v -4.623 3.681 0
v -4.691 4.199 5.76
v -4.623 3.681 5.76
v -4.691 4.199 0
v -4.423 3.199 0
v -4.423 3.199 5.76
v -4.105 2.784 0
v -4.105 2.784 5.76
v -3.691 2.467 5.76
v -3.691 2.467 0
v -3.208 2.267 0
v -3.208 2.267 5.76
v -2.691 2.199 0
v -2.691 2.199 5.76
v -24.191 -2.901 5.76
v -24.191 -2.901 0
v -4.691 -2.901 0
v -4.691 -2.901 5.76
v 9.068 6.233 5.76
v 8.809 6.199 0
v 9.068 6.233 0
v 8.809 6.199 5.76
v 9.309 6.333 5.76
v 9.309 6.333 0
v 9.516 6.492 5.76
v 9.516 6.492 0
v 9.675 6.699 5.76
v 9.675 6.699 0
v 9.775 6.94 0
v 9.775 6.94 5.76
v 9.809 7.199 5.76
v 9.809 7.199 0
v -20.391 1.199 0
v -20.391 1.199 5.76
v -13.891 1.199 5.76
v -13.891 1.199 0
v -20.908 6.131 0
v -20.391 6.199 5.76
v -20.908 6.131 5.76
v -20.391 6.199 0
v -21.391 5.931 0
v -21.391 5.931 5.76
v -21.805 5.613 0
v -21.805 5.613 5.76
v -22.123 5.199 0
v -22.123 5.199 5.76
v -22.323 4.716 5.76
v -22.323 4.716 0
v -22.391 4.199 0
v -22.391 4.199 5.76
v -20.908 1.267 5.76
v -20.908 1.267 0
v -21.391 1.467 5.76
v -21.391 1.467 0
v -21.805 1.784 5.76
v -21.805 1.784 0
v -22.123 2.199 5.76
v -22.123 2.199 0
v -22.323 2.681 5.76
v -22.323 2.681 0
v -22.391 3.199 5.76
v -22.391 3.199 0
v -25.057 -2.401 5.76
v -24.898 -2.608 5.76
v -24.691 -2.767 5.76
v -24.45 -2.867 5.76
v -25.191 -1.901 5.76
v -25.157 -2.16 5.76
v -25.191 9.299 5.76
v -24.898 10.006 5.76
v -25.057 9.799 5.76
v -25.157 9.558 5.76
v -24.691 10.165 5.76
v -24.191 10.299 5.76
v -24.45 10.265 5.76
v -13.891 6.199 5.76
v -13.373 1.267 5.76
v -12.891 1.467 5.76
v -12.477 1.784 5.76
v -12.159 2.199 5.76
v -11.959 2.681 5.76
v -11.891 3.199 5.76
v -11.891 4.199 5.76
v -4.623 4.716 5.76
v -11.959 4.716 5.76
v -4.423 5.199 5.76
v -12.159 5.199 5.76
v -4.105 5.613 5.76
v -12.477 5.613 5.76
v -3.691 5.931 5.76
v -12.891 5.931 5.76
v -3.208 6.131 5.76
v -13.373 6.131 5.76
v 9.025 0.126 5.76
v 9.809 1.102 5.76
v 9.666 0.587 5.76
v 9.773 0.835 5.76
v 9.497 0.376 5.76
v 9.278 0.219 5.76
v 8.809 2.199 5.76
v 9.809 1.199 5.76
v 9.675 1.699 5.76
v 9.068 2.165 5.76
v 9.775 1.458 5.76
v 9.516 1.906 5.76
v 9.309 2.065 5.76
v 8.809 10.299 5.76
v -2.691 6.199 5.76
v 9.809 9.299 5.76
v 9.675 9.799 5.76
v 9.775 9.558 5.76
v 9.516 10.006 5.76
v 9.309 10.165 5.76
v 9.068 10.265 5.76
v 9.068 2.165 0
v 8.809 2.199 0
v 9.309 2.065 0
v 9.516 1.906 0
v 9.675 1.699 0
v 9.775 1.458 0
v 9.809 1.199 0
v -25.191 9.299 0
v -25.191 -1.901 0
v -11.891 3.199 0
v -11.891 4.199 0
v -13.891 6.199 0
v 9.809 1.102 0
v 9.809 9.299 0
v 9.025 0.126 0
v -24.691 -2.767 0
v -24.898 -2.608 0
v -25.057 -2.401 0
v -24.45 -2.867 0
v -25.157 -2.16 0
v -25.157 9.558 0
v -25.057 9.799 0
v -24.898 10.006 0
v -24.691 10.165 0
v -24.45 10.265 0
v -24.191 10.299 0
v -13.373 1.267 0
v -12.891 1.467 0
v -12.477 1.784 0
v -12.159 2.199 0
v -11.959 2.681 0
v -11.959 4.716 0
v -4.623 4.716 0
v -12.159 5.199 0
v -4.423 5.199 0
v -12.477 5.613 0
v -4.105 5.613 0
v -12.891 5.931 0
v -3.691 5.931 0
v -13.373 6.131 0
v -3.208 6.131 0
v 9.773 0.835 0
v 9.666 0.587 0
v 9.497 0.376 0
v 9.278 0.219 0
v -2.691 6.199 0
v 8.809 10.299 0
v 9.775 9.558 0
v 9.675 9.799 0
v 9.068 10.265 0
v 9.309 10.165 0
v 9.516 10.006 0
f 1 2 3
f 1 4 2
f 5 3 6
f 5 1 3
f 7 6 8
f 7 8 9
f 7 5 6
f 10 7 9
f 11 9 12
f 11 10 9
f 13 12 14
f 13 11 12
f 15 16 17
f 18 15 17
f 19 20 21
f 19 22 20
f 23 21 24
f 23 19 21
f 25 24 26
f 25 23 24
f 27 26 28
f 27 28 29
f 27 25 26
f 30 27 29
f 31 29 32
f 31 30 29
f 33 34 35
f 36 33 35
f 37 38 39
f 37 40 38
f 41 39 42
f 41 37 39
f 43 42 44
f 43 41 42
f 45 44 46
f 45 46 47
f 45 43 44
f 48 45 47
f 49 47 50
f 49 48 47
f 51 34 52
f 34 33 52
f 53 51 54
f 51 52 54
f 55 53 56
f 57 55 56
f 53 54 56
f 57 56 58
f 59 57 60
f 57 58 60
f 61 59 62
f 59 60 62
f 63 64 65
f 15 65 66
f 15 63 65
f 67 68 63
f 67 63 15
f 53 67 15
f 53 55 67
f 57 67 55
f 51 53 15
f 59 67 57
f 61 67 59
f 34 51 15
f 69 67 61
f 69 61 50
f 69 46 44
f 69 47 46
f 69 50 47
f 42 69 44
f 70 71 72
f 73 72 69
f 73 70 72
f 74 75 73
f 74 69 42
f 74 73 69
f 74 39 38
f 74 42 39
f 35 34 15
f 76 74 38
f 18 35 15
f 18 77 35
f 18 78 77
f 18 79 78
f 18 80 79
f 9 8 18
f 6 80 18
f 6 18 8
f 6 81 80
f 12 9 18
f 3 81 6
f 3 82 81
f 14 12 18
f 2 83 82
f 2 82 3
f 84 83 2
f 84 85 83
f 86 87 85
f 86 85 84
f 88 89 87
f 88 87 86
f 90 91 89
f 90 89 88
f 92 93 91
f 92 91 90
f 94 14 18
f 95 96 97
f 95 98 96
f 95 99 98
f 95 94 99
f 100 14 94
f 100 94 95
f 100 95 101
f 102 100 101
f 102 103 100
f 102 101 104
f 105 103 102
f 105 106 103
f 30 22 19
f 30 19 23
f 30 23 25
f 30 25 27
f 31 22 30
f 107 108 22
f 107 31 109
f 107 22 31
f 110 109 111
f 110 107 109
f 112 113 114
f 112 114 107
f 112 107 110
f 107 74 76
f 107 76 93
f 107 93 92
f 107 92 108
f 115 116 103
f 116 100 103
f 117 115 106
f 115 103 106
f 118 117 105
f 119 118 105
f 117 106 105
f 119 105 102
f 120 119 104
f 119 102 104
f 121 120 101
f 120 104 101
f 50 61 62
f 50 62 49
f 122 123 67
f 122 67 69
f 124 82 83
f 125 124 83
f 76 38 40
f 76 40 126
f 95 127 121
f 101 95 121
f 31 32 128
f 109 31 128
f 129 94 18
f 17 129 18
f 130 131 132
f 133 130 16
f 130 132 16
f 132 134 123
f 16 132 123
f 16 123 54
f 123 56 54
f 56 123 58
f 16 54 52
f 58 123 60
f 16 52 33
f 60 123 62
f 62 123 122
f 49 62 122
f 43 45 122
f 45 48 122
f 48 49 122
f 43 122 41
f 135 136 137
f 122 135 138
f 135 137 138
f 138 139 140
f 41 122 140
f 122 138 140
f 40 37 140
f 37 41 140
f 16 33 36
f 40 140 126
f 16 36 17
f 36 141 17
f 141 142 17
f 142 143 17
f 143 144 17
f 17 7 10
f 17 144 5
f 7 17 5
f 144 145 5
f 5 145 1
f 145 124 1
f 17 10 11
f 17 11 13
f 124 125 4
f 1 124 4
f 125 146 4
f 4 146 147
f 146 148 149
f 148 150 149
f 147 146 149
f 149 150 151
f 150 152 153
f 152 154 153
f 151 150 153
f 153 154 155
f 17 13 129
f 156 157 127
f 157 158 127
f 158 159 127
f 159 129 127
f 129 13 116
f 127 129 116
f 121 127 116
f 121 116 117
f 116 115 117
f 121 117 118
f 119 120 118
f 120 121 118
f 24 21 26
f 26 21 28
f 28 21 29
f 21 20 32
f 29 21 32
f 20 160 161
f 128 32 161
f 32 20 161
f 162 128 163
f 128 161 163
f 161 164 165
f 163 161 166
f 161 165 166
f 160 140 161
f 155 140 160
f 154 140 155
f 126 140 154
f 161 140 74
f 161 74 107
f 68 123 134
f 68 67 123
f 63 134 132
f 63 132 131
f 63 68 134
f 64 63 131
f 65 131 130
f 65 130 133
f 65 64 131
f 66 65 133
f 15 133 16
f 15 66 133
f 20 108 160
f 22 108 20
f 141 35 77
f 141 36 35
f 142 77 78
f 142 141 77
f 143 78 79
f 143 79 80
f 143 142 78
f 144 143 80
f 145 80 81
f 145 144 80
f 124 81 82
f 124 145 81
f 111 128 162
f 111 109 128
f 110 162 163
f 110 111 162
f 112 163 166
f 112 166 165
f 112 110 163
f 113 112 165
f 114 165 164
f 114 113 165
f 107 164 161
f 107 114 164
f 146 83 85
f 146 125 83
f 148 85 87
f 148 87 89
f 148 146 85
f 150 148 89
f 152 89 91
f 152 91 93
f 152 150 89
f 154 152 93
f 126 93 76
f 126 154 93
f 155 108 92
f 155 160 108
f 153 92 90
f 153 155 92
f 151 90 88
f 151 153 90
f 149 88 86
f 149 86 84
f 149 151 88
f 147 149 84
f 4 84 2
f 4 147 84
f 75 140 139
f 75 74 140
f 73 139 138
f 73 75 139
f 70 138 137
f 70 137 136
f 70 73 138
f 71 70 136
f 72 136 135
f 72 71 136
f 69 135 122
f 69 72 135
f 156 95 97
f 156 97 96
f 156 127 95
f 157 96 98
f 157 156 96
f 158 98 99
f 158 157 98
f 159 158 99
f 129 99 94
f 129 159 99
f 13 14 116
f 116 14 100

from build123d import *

# Parameters (mm, degrees)
F0_W     = 35
F0_H     = 13.2
F1_DEPTH = 5.76
F2_W     = 10.5
F2_H     = 5
F2_W_2   = 15
F2_H_2   = 4
F3_DEPTH = 25
F4_R     = 1.99999
F5_R     = 1


# Not quite as in the source:
# - a fillet or chamfer is up to 0.001 mm smaller than in the source, because OpenCascade refuses the exact size


with BuildPart() as f1:
    # F0 (on Top) → F1 (new body)
    with BuildSketch(Plane.XY):
        with Locations((-7.6907900348, 3.6986840781)):
            Rectangle(F0_W, F0_H)
    extrude(amount=F1_DEPTH)

    # F2 (on face) → F3 (cut)
    with BuildSketch(Plane.XY.offset(5.76)):
        Polygon((-4.6907900348, -2.9013159219), (9.8092099652, -2.9013159219), (9.8092099652, 0.2986840781), align=None)
        with Locations((-17.1407900348, 3.6986840781)):
            Rectangle(F2_W, F2_H)
        with Locations((2.8092099652, 4.1986840781)):
            Rectangle(F2_W_2, F2_H_2)
    extrude(amount=-F3_DEPTH, mode=Mode.SUBTRACT)

    # F4 (radius 2 in the source; OpenCascade refuses exactly that, so slightly less here)
    f4_edges = [f1.edges().sort_by_distance(p)[0] for p in [
        (-22.39079, 6.198684, 2.88),
        (-11.89079, 6.198684, 2.88),
        (-11.89079, 1.198684, 2.88),
        (-22.39079, 1.198684, 2.88),
        (-4.69079, 2.198684, 2.88),
        (-4.69079, 6.198684, 2.88),
    ]]
    fillet(f4_edges, radius=F4_R)

    # F5
    f5_edges = [f1.edges().sort_by_distance(p)[0] for p in [
        (9.80921, 10.298684, 2.88),
        (9.80921, 6.198684, 2.88),
        (9.80921, 2.198684, 2.88),
        (9.80921, 0.298684, 2.88),
        (-25.19079, -2.901316, 2.88),
        (-25.19079, 10.298684, 2.88),
    ]]
    fillet(f5_edges, radius=F5_R)


solid = f1.part
